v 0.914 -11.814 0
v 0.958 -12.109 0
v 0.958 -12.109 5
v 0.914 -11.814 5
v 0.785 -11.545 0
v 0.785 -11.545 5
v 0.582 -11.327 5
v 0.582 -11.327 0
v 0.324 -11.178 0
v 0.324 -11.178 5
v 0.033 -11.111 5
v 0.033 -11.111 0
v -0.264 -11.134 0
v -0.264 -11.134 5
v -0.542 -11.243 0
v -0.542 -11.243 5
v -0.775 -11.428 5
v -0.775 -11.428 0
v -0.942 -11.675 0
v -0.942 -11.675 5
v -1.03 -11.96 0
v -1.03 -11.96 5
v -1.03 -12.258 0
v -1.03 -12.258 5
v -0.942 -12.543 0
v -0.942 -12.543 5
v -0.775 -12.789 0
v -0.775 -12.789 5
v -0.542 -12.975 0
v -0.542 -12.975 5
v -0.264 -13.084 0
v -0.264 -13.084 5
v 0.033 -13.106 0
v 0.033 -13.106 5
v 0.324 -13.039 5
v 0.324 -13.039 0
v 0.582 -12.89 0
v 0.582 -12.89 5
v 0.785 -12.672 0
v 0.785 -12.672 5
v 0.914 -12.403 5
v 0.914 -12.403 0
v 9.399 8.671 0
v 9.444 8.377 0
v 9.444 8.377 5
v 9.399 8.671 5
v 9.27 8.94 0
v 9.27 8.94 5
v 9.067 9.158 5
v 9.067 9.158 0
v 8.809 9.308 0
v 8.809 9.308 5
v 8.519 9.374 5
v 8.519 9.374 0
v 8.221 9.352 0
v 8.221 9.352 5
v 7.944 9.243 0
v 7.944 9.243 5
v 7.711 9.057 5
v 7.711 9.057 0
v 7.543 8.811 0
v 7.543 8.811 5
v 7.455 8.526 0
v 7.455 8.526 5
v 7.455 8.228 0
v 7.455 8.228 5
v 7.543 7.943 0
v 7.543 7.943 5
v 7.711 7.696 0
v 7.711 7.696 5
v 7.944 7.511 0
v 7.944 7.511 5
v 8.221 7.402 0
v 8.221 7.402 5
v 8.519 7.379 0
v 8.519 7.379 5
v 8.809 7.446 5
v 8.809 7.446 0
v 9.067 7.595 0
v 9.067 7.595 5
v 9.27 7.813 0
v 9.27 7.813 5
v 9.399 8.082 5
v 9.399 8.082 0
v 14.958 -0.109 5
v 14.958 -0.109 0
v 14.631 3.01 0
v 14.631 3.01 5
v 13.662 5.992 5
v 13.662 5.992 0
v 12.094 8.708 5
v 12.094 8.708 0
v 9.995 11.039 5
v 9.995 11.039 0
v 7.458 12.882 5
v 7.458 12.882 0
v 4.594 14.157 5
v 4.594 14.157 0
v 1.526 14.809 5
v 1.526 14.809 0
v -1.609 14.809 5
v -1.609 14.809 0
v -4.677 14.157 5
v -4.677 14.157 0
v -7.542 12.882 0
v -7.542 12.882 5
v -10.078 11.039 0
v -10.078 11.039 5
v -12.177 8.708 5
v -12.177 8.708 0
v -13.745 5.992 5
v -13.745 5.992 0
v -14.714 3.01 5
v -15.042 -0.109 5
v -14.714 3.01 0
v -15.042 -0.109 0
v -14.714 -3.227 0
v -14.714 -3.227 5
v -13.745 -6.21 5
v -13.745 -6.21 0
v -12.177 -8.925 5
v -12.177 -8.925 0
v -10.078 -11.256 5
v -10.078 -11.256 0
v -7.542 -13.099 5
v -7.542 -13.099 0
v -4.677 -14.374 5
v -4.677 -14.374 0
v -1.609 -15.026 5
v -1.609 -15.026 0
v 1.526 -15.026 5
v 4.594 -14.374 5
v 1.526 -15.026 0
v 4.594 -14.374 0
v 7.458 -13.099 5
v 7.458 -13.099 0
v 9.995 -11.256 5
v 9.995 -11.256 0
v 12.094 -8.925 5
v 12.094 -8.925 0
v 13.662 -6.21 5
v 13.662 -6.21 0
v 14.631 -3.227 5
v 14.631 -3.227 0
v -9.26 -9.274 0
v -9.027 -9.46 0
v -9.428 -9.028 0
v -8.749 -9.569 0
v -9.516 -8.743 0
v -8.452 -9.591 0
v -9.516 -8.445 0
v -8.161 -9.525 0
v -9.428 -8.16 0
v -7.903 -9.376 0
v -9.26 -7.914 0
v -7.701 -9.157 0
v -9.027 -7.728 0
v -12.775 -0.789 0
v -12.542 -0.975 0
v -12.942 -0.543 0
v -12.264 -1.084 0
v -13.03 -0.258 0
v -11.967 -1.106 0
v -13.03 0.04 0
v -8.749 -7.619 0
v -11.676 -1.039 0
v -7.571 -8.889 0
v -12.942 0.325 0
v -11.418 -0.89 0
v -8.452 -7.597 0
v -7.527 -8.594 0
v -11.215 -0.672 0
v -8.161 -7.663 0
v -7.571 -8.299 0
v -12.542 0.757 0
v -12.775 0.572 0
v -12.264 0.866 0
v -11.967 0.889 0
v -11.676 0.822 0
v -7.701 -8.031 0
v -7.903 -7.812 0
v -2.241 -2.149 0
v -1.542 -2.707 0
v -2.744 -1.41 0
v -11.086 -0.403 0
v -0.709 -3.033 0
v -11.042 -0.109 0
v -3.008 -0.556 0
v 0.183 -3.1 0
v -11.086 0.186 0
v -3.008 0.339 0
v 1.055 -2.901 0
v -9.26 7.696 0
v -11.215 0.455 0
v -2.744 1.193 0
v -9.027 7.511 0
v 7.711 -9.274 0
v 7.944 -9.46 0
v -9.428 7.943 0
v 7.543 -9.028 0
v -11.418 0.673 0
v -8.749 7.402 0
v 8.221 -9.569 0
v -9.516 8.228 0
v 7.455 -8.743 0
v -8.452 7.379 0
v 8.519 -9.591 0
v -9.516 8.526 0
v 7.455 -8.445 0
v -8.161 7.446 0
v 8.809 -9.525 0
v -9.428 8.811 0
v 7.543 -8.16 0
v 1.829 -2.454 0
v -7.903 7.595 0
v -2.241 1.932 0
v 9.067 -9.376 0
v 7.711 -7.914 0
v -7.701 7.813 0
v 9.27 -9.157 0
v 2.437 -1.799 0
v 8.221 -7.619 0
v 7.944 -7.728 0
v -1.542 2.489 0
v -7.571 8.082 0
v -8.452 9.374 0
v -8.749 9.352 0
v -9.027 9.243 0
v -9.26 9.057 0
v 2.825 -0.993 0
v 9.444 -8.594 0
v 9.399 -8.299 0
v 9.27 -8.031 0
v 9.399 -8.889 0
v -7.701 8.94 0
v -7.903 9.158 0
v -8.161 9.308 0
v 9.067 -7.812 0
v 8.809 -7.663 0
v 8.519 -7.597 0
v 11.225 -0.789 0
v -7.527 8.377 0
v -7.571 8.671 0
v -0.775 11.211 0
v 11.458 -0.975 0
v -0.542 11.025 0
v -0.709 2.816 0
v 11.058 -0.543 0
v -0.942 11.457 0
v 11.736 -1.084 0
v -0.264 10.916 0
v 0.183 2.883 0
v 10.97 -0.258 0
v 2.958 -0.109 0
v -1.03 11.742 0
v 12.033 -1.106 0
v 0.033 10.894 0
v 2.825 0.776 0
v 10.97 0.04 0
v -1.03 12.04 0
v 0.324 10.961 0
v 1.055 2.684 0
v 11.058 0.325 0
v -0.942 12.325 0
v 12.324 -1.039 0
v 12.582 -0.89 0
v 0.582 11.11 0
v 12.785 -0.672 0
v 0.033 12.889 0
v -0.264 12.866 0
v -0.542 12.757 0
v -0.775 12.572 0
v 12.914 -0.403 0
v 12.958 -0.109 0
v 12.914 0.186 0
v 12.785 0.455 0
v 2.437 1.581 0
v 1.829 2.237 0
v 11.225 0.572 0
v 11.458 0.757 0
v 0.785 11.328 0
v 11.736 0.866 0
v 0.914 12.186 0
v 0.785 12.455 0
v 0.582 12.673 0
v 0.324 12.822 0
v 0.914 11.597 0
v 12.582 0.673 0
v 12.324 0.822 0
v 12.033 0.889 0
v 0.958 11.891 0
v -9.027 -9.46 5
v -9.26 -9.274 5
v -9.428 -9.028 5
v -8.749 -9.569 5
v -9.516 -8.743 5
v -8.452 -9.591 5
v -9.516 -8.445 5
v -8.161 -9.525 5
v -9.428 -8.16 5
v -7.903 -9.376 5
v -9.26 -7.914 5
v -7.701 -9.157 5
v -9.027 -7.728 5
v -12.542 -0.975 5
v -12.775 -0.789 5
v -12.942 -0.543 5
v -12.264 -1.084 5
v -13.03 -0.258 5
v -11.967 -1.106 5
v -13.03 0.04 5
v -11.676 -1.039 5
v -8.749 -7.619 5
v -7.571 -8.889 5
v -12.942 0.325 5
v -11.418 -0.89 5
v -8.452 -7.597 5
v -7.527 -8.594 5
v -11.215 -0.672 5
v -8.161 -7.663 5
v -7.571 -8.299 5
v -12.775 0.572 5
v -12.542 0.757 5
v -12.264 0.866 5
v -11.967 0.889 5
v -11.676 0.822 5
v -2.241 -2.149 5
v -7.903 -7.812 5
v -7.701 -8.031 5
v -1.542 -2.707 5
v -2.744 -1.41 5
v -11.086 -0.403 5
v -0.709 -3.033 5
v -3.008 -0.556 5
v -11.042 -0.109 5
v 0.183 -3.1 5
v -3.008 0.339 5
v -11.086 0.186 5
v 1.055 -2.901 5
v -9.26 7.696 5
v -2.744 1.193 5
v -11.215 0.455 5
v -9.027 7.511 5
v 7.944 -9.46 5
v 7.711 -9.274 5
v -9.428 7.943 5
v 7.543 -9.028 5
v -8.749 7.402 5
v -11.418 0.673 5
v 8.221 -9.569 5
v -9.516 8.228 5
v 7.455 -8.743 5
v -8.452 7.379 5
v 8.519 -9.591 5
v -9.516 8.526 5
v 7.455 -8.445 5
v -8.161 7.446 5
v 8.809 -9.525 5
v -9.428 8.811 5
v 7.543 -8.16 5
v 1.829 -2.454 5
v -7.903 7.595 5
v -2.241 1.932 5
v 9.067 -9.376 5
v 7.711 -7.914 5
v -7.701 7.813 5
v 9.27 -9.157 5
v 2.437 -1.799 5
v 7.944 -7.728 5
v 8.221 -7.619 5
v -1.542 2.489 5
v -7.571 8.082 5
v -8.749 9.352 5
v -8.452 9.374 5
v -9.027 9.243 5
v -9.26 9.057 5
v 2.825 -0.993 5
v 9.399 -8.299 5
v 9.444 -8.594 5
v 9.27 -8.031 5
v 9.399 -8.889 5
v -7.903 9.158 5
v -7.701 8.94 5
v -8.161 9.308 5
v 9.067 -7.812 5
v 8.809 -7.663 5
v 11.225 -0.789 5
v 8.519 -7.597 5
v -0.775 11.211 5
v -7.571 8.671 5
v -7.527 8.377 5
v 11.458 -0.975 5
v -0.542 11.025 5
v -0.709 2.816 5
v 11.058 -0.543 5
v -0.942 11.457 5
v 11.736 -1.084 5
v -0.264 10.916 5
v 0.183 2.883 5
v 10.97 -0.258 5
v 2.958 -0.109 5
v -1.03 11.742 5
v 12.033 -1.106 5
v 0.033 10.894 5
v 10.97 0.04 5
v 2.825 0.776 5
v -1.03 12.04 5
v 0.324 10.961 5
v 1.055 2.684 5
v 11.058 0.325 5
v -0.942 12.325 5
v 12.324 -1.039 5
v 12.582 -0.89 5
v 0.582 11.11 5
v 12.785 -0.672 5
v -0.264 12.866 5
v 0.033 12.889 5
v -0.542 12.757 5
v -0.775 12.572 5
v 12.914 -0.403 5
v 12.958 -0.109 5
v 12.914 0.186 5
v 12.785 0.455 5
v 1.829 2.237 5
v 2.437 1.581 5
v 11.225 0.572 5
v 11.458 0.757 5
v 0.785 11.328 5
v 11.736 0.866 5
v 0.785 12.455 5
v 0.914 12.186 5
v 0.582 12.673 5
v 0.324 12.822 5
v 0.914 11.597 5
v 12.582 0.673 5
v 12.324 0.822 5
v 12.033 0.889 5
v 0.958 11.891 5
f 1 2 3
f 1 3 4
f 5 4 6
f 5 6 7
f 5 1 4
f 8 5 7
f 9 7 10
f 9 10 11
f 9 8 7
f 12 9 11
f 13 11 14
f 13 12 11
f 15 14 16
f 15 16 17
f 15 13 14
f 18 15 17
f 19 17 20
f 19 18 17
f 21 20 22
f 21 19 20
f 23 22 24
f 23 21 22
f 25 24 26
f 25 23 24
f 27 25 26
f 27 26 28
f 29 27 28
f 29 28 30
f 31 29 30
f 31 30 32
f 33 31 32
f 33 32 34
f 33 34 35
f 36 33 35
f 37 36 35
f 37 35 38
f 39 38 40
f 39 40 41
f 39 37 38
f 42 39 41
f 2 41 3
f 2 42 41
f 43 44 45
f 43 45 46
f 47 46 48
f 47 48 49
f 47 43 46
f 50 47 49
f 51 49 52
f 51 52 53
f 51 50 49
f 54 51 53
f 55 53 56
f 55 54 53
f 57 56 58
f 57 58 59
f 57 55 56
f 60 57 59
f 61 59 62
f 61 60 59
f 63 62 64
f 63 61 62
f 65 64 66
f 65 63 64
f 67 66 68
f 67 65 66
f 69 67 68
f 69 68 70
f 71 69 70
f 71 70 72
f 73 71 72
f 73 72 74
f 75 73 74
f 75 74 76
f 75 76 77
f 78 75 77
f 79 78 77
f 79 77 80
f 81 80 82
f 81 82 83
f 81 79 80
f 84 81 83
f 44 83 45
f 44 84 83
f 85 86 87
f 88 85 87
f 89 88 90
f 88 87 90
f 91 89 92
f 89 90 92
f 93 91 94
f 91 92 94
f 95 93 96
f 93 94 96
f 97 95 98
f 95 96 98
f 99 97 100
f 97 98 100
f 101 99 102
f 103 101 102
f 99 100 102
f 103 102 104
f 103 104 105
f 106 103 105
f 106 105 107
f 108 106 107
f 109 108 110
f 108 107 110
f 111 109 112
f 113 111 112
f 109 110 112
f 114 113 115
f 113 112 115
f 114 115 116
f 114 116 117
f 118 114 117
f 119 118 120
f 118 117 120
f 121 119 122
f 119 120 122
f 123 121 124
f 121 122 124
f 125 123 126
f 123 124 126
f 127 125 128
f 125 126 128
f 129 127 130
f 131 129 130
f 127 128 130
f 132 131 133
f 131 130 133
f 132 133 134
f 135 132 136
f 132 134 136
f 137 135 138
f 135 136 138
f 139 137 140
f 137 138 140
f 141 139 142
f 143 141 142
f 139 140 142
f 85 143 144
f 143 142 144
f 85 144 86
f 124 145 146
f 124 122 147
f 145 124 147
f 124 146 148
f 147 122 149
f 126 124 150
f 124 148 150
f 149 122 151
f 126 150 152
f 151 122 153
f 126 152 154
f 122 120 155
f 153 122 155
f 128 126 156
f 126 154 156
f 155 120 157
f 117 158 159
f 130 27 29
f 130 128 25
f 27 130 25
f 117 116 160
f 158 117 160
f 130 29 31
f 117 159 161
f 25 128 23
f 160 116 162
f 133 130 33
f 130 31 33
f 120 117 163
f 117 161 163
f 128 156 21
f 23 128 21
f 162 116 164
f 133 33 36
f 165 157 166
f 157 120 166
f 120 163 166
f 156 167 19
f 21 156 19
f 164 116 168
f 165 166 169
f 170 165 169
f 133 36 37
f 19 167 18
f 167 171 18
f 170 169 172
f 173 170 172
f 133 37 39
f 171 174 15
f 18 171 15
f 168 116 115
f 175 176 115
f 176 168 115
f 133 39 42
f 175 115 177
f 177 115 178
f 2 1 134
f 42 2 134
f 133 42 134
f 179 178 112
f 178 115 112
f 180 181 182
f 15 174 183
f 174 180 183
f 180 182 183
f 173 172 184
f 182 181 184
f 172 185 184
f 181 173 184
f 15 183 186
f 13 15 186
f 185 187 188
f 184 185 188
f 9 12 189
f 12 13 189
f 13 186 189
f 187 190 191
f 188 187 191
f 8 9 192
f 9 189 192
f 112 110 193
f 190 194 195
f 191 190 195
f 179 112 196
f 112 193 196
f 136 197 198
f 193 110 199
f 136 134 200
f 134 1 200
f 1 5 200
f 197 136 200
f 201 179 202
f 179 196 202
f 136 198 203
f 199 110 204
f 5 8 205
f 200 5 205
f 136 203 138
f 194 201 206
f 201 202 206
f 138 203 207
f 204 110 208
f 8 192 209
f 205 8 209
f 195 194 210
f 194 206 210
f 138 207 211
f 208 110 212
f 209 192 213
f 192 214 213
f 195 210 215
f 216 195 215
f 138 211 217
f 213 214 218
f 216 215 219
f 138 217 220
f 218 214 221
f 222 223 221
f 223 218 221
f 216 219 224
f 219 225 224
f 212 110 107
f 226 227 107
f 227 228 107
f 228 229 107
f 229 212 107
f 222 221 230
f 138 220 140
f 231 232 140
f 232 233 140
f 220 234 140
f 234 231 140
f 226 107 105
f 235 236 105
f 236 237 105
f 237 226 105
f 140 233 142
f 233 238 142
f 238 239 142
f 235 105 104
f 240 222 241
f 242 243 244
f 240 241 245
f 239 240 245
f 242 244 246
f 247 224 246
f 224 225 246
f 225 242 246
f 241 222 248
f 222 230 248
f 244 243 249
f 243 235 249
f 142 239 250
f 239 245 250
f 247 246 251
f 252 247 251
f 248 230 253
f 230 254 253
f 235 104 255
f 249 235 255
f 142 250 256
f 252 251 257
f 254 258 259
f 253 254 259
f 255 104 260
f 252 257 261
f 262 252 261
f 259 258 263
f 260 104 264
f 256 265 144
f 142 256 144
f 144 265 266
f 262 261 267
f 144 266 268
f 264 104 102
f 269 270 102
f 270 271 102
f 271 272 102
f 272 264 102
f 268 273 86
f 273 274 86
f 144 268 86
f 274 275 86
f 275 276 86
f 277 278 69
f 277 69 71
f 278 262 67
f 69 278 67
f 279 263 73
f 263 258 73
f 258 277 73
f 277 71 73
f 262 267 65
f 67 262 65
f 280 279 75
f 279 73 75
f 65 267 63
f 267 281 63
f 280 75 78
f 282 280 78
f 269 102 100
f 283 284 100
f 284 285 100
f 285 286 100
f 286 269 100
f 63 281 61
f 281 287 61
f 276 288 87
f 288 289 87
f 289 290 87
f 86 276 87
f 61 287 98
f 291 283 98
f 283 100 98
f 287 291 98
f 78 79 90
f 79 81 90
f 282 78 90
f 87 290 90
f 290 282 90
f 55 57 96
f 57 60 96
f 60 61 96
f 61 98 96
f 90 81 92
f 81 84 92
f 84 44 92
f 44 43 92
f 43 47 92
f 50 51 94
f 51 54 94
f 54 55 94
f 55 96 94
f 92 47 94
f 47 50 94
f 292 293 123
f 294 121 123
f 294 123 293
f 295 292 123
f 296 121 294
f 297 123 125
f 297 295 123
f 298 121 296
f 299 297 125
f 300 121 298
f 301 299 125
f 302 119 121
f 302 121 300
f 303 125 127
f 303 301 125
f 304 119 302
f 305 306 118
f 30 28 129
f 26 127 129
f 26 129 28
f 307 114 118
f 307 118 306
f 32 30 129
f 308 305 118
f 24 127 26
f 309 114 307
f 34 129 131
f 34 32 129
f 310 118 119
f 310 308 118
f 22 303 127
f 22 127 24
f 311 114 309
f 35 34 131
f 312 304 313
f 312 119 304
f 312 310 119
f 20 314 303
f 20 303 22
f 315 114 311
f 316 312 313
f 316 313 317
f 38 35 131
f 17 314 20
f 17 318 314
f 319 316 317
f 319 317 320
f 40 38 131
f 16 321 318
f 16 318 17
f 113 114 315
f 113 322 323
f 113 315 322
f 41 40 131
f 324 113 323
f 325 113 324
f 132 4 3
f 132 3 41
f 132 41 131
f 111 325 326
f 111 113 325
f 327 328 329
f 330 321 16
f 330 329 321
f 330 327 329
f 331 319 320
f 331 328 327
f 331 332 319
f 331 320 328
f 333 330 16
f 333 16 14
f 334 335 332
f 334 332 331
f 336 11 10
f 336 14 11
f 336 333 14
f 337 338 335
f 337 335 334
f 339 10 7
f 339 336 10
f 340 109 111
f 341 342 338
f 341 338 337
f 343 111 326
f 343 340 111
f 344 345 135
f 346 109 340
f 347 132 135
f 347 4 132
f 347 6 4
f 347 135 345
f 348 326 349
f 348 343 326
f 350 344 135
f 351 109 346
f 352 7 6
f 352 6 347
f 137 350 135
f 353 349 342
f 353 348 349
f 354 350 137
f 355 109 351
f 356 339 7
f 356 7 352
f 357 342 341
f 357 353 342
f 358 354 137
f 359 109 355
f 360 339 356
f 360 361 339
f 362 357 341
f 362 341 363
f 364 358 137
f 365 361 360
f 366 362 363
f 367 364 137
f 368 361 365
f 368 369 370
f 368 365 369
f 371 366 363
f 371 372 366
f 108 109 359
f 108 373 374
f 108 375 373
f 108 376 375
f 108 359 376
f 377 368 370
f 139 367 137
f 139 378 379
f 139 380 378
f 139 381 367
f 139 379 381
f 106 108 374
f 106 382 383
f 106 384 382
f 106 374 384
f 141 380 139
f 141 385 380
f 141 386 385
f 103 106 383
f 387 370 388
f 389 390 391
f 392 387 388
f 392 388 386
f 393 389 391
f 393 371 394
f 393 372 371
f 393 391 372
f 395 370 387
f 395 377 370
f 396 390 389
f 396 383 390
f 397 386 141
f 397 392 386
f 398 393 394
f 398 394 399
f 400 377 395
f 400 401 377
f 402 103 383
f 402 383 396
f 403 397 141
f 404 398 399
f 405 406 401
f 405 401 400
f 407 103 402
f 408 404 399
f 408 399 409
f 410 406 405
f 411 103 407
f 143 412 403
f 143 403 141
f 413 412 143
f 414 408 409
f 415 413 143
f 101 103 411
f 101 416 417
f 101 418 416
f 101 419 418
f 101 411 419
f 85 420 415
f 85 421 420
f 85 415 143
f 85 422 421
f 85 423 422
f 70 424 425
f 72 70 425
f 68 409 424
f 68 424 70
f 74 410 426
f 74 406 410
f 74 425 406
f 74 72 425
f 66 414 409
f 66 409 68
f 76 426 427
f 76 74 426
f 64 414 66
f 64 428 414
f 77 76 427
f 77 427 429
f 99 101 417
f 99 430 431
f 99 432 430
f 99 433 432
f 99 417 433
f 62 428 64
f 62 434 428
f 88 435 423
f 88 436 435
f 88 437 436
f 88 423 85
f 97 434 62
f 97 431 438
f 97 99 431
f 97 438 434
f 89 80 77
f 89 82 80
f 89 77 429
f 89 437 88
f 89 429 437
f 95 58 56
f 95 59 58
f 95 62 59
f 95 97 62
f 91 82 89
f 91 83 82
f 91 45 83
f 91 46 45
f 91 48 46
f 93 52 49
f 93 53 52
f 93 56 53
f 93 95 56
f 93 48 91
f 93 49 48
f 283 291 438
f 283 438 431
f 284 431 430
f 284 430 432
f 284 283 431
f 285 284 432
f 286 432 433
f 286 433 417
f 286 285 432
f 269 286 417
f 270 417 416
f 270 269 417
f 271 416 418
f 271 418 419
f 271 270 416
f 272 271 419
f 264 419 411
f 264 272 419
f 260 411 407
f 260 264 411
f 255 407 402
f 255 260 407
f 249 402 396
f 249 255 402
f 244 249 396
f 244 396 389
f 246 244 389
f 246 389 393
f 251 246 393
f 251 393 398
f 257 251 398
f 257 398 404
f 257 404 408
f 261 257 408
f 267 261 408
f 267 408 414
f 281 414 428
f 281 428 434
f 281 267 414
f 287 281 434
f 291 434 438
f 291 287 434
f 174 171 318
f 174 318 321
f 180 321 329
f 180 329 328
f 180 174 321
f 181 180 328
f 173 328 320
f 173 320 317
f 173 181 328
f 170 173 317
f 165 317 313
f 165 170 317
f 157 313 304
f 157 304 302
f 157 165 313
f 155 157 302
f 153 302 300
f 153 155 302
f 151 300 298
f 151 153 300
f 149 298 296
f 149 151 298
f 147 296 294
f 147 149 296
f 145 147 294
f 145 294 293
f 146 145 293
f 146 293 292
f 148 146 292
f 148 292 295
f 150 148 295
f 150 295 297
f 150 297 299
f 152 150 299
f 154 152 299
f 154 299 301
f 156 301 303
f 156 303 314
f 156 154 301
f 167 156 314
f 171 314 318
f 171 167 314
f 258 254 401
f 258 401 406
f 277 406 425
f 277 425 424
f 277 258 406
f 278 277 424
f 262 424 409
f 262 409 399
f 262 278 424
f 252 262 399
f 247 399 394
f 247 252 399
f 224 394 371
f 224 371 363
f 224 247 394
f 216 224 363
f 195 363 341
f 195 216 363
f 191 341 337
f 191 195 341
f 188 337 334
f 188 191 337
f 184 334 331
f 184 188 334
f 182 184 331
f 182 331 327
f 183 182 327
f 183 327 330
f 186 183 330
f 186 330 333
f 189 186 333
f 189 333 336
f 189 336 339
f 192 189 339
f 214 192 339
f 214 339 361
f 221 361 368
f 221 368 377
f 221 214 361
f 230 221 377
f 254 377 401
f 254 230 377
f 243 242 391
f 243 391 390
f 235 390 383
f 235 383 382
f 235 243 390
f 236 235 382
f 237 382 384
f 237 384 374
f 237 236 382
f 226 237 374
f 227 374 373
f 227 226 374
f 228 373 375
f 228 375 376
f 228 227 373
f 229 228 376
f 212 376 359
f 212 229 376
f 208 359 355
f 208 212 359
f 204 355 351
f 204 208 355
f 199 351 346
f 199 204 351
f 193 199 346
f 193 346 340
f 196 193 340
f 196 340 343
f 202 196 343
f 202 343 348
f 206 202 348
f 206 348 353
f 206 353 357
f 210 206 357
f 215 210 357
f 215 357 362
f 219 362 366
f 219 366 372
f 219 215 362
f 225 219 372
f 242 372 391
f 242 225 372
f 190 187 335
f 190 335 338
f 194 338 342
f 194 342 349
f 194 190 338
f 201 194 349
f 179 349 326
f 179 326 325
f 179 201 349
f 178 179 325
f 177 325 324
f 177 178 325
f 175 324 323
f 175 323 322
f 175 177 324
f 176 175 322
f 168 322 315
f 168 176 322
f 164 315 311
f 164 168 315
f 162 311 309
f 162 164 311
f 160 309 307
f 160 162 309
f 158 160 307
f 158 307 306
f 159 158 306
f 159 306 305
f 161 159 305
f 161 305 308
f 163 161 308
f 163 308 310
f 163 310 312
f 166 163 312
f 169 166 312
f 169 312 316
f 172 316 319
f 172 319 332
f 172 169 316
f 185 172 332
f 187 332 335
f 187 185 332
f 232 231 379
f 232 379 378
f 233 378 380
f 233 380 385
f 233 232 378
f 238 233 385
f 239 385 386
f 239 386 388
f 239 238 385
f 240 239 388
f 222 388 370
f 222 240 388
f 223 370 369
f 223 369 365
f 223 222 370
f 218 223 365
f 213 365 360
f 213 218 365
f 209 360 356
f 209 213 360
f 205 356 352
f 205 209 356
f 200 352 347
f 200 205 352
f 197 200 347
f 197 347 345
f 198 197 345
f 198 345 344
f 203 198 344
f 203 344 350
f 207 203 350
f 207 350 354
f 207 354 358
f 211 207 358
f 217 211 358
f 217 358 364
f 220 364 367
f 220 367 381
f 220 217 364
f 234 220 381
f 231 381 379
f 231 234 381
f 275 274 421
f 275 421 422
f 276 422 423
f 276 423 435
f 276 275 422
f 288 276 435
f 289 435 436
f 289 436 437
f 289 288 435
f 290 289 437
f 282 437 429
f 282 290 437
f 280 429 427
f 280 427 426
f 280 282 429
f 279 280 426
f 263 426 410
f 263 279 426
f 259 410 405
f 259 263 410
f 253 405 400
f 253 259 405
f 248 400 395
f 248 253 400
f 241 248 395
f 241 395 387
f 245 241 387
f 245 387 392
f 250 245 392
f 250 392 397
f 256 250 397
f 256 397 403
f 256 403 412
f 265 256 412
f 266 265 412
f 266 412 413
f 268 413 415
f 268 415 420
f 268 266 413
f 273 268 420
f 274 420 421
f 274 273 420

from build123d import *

# Parameters (mm, degrees)
SKETCH1_R           = 15
SKETCH1_R_2         = 1
SKETCH1_R_3         = 1.000000019
SKETCH1_R_4         = 3
BOSS_EXTRUDE1_DEPTH = 5


with BuildPart() as part:
    # Sketch1 → Boss-Extrude1 (new body)
    with BuildSketch(Plane.XY):
        with Locations((-0.041510791, -0.108617644)):
            Circle(SKETCH1_R)
        with Locations((-0.041510791, 11.891382356)):
            Circle(SKETCH1_R_2, mode=Mode.SUBTRACT)
        with Locations((8.443770584, 8.37666373)):
            Circle(SKETCH1_R_2, mode=Mode.SUBTRACT)
        with Locations((11.958489209, -0.108617664)):
            Circle(SKETCH1_R_3, mode=Mode.SUBTRACT)
        with Locations((-0.041510791, -12.108617644)):
            Circle(SKETCH1_R_2, mode=Mode.SUBTRACT)
        with Locations((8.443770584, -8.593899018)):
            Circle(SKETCH1_R_2, mode=Mode.SUBTRACT)
        with Locations((-8.526792165, -8.593899018)):
            Circle(SKETCH1_R_2, mode=Mode.SUBTRACT)
        with Locations((-12.041510791, -0.108617644)):
            Circle(SKETCH1_R_2, mode=Mode.SUBTRACT)
        with Locations((-8.526792165, 8.37666373)):
            Circle(SKETCH1_R_2, mode=Mode.SUBTRACT)
        with Locations((-0.041510791, -0.108617644)):
            Circle(SKETCH1_R_4, mode=Mode.SUBTRACT)
    extrude(amount=BOSS_EXTRUDE1_DEPTH)


solid = part.part
